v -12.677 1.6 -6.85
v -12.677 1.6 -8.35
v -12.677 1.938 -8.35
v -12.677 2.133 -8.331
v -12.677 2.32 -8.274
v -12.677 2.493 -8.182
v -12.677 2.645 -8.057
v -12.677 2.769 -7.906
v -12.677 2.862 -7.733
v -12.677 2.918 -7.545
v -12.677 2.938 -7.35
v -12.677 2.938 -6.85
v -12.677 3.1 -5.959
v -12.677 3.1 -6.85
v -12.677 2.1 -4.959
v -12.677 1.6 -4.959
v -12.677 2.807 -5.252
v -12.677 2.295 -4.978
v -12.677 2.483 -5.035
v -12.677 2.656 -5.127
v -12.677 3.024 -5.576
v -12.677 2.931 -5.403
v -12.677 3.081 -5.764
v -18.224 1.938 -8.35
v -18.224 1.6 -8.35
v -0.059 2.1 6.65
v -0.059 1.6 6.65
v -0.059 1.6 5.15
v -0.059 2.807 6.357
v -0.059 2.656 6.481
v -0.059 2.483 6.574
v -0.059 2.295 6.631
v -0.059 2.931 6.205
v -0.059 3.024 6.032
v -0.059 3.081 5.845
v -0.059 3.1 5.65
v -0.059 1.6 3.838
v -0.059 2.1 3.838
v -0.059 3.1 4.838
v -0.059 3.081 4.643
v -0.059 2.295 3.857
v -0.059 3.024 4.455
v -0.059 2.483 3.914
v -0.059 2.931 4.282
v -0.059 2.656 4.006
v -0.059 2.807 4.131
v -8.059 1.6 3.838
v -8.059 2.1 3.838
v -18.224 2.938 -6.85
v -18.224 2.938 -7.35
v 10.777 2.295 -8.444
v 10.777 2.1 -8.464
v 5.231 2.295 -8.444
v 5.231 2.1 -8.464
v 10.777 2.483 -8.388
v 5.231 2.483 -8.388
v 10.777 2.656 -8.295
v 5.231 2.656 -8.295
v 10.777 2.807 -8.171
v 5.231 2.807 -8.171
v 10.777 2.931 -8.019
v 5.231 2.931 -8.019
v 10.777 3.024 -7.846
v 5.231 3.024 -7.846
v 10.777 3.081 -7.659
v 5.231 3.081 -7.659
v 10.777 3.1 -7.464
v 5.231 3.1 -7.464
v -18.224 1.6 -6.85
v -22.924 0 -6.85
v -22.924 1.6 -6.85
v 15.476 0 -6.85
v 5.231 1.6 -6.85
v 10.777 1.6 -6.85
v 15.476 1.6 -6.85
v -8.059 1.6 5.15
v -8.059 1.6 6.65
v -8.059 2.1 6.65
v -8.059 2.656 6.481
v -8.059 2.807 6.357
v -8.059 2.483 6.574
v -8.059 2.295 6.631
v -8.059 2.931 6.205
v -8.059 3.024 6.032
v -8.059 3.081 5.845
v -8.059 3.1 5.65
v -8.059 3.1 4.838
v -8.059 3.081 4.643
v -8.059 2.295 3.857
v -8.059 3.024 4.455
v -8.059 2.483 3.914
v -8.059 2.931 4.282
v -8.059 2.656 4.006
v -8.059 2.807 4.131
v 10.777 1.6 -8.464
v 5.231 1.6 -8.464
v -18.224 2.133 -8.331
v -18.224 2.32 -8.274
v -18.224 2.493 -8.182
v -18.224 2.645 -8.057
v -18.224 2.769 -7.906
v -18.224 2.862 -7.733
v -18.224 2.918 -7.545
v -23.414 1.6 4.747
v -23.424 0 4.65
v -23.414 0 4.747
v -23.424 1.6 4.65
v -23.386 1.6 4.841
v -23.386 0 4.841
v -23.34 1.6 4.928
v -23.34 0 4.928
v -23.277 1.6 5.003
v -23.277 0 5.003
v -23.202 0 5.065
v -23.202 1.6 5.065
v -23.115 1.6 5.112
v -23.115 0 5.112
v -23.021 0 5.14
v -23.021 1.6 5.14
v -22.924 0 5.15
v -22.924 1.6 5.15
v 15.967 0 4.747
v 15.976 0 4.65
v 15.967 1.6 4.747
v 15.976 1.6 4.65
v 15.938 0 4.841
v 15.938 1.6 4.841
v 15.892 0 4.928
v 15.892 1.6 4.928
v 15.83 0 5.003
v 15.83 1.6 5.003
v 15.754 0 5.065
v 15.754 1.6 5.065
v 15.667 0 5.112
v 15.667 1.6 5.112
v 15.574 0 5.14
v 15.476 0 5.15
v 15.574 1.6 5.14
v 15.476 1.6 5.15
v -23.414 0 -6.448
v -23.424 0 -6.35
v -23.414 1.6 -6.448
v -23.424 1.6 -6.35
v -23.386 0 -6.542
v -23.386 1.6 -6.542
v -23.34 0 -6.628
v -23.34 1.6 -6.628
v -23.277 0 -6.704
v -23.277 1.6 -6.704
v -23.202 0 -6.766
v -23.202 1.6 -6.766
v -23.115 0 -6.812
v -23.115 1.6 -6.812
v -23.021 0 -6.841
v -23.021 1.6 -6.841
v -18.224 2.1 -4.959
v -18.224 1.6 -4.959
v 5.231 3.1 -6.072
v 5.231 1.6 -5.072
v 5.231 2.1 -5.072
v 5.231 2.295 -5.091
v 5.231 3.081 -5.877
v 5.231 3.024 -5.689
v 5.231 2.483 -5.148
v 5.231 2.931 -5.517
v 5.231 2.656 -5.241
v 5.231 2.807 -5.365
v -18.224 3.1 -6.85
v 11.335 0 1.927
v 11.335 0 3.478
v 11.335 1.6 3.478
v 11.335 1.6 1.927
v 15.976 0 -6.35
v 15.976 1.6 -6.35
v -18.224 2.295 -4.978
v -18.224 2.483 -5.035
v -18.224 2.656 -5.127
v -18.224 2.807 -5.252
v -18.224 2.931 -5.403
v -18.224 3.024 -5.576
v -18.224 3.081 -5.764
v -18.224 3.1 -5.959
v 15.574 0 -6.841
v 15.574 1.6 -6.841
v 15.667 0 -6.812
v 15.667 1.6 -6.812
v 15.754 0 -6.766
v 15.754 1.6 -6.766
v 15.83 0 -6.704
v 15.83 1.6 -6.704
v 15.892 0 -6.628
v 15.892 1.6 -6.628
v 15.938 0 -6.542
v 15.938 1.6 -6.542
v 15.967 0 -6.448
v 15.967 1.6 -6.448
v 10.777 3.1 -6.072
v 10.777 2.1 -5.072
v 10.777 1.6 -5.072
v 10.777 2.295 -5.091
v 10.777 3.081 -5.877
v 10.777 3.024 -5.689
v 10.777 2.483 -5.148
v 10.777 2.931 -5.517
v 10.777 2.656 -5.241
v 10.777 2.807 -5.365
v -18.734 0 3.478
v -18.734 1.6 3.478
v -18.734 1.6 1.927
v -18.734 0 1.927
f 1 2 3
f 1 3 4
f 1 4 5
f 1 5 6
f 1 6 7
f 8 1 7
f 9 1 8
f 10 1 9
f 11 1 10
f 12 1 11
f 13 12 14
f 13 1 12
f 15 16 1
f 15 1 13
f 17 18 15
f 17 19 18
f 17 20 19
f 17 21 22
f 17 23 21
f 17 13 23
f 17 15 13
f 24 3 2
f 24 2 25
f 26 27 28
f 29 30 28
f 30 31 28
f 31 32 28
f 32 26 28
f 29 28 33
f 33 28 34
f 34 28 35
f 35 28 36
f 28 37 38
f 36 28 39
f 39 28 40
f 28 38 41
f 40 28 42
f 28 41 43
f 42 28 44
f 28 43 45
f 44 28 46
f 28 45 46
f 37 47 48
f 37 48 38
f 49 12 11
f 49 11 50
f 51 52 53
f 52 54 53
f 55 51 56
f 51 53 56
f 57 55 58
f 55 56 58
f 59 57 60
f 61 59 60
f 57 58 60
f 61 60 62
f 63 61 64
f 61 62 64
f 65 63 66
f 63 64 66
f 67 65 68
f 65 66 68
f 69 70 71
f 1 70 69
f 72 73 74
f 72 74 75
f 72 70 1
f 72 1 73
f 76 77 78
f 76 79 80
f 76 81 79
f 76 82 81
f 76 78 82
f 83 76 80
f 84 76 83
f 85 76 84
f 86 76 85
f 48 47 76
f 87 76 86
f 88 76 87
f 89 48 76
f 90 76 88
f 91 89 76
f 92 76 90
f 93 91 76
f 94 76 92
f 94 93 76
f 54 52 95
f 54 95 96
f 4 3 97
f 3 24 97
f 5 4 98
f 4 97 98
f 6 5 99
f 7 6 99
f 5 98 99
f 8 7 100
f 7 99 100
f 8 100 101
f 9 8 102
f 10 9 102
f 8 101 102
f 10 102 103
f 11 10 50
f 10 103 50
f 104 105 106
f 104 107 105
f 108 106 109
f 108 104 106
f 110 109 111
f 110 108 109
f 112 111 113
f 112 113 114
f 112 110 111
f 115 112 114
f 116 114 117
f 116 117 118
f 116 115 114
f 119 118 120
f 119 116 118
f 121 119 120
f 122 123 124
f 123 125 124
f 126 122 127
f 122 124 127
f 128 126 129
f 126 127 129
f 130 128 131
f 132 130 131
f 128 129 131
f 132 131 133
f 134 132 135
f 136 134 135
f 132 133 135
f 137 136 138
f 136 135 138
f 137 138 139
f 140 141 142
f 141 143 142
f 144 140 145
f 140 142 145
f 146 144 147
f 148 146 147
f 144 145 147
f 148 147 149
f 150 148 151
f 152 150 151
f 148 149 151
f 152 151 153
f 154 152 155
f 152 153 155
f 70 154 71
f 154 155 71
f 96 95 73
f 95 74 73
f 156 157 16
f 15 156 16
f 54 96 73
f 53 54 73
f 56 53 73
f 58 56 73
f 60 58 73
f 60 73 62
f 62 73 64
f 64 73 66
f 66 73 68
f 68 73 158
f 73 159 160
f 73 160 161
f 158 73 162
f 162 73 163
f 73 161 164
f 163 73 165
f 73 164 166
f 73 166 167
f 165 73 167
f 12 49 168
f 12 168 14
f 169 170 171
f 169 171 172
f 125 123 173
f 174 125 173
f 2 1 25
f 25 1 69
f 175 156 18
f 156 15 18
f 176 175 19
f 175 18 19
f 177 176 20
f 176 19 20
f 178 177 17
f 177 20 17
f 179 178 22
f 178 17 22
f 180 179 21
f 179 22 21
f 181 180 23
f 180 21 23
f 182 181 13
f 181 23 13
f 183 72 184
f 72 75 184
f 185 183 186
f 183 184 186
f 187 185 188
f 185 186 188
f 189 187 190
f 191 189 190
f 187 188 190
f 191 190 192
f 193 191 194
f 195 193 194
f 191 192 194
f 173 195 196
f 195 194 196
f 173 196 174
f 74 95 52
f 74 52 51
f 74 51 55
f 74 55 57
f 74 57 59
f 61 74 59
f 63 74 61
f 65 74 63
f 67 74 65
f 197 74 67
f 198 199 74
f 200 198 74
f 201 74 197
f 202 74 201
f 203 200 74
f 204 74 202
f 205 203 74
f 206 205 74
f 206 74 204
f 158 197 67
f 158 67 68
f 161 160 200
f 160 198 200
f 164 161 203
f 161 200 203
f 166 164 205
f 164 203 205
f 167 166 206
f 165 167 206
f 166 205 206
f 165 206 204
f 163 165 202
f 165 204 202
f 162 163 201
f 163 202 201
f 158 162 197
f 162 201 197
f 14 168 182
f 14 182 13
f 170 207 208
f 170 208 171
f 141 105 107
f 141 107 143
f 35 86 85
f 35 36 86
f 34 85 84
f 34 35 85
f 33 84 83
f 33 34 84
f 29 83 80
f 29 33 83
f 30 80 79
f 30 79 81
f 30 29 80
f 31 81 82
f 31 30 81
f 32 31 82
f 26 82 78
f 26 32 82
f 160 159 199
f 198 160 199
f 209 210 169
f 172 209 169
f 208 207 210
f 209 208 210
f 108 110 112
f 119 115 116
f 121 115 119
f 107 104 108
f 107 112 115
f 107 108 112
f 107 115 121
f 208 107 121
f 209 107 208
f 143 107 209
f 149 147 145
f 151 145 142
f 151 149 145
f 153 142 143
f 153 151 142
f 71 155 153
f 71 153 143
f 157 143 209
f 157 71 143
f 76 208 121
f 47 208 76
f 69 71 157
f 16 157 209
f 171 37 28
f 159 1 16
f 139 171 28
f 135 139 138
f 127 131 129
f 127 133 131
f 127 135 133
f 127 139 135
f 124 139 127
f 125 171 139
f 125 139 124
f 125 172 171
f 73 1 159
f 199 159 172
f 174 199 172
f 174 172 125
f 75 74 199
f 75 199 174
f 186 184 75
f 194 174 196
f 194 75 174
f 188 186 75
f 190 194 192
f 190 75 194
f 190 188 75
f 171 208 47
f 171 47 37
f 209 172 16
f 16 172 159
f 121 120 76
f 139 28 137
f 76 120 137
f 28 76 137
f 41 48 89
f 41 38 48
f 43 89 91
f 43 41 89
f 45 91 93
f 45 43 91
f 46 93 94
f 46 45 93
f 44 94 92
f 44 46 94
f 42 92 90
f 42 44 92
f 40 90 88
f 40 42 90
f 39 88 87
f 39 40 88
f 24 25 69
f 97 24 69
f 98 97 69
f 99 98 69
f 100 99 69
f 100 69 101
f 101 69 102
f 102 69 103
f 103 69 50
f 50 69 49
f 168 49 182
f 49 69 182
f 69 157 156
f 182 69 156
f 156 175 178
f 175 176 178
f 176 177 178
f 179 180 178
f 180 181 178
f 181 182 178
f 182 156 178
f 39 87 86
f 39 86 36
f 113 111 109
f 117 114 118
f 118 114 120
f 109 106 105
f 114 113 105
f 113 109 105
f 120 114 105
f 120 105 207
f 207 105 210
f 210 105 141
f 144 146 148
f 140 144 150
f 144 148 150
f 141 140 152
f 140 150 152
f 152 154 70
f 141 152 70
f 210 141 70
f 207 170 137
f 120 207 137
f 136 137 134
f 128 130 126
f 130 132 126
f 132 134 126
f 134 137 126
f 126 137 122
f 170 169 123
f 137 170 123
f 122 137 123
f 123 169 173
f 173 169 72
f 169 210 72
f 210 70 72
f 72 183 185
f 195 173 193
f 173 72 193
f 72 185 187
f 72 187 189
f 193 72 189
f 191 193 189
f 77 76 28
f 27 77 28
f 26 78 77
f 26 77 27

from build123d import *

# Parameters (mm, degrees)
SKETCH1_W           = 39.4
SKETCH1_H           = 12
SKETCH1_W_2         = 30.068441065
SKETCH1_H_2         = 1.551330798
BOSS_EXTRUDE2_DEPTH = 1.6
SKETCH2_W           = 5.546376038
SKETCH2_H           = 1.891525972
SKETCH2_W_2         = 8
SKETCH2_H_2         = 1.312065252
BOSS_EXTRUDE4_DEPTH = 1.5
SKETCH5_W           = 5.546376038
SKETCH5_H           = 1.337693851
BOSS_EXTRUDE5_DEPTH = 1.5
SKETCH7_W           = 5.546376038
SKETCH7_H           = 1.5
BOSS_EXTRUDE6_DEPTH = 1.5
SKETCH9_W           = 8
SKETCH9_H           = 1.5
BOSS_EXTRUDE7_DEPTH = 1.5
FILLET3_R           = 1
FILLET4_R           = 1
FILLET5_R           = 1
FILLET6_R           = 1
FILLET7_R           = 0.5


with BuildPart() as part:
    # Sketch1 → Boss-Extrude2 (new body)
    with BuildSketch(Plane(origin=(0, 0, 0), x_dir=(1, 0, 0), z_dir=(0, 1, 0))):
        with Locations((-3.723847257, 0.850254859)):
            Rectangle(SKETCH1_W, SKETCH1_H)
        with Locations((-3.699480126, -2.702390472)):
            Rectangle(SKETCH1_W_2, SKETCH1_H_2, mode=Mode.SUBTRACT)
    extrude(amount=BOSS_EXTRUDE2_DEPTH)

    # Sketch2 → Boss-Extrude4 (add)
    with BuildSketch(Plane(origin=(0, 1.6, 0), x_dir=(1, 0, 0), z_dir=(0, 1, 0))):
        with Locations((-15.450659238, 5.904491873)):
            Rectangle(SKETCH2_W, SKETCH2_H)
        with Locations((8.004202505, 6.017944023)):
            Rectangle(SKETCH2_W, SKETCH2_H)
        with Locations((-4.058606796, -4.493712515)):
            Rectangle(SKETCH2_W_2, SKETCH2_H_2)
    extrude(amount=BOSS_EXTRUDE4_DEPTH)

    # Sketch5 → Boss-Extrude5 (add)
    with BuildSketch(Plane(origin=(0, 0, -6.850254859), x_dir=(-1, 0, 0), z_dir=(0, 0, -1))):
        with Locations((15.450659238, 2.268846926)):
            Rectangle(SKETCH5_W, SKETCH5_H)
    extrude(amount=BOSS_EXTRUDE5_DEPTH)

    # Sketch7 → Boss-Extrude6 (add)
    with BuildSketch(Plane(origin=(0, 0, -6.963707009), x_dir=(-1, 0, 0), z_dir=(0, 0, -1))):
        with Locations((-8.004202505, 2.35)):
            Rectangle(SKETCH7_W, SKETCH7_H)
    extrude(amount=BOSS_EXTRUDE6_DEPTH)

    # Sketch9 → Boss-Extrude7 (add)
    with BuildSketch(Plane.XY.offset(5.149745141)):
        with Locations((-4.058606796, 2.35)):
            Rectangle(SKETCH9_W, SKETCH9_H)
    extrude(amount=BOSS_EXTRUDE7_DEPTH)

    # Fillet3
    fillet3_edges = [part.edges().sort_by_distance(p)[0] for p in [
        (-4.058606796, 3.1, 6.649745141),
    ]]
    fillet(fillet3_edges, radius=FILLET3_R)

    # Fillet4
    fillet4_edges = [part.edges().sort_by_distance(p)[0] for p in [
        (-15.450659238, 2.937693851, -8.350254859),
        (8.004202505, 3.1, -8.463707009),
    ]]
    fillet(fillet4_edges, radius=FILLET4_R)

    # Fillet5
    fillet5_edges = [part.edges().sort_by_distance(p)[0] for p in [
        (8.004202505, 3.1, -5.072181037),
        (-15.450659238, 3.1, -4.958728887),
    ]]
    fillet(fillet5_edges, radius=FILLET5_R)

    # Fillet6
    fillet6_edges = [part.edges().sort_by_distance(p)[0] for p in [
        (-4.058606796, 3.1, 3.837679889),
    ]]
    fillet(fillet6_edges, radius=FILLET6_R)

    # Fillet7
    fillet7_edges = [part.edges().sort_by_distance(p)[0] for p in [
        (-23.423847257, 0.8, -6.850254859),
        (15.976152743, 0.8, -6.850254859),
        (15.976152743, 0.8, 5.149745141),
        (-23.423847257, 0.8, 5.149745141),
    ]]
    fillet(fillet7_edges, radius=FILLET7_R)


solid = part.part
